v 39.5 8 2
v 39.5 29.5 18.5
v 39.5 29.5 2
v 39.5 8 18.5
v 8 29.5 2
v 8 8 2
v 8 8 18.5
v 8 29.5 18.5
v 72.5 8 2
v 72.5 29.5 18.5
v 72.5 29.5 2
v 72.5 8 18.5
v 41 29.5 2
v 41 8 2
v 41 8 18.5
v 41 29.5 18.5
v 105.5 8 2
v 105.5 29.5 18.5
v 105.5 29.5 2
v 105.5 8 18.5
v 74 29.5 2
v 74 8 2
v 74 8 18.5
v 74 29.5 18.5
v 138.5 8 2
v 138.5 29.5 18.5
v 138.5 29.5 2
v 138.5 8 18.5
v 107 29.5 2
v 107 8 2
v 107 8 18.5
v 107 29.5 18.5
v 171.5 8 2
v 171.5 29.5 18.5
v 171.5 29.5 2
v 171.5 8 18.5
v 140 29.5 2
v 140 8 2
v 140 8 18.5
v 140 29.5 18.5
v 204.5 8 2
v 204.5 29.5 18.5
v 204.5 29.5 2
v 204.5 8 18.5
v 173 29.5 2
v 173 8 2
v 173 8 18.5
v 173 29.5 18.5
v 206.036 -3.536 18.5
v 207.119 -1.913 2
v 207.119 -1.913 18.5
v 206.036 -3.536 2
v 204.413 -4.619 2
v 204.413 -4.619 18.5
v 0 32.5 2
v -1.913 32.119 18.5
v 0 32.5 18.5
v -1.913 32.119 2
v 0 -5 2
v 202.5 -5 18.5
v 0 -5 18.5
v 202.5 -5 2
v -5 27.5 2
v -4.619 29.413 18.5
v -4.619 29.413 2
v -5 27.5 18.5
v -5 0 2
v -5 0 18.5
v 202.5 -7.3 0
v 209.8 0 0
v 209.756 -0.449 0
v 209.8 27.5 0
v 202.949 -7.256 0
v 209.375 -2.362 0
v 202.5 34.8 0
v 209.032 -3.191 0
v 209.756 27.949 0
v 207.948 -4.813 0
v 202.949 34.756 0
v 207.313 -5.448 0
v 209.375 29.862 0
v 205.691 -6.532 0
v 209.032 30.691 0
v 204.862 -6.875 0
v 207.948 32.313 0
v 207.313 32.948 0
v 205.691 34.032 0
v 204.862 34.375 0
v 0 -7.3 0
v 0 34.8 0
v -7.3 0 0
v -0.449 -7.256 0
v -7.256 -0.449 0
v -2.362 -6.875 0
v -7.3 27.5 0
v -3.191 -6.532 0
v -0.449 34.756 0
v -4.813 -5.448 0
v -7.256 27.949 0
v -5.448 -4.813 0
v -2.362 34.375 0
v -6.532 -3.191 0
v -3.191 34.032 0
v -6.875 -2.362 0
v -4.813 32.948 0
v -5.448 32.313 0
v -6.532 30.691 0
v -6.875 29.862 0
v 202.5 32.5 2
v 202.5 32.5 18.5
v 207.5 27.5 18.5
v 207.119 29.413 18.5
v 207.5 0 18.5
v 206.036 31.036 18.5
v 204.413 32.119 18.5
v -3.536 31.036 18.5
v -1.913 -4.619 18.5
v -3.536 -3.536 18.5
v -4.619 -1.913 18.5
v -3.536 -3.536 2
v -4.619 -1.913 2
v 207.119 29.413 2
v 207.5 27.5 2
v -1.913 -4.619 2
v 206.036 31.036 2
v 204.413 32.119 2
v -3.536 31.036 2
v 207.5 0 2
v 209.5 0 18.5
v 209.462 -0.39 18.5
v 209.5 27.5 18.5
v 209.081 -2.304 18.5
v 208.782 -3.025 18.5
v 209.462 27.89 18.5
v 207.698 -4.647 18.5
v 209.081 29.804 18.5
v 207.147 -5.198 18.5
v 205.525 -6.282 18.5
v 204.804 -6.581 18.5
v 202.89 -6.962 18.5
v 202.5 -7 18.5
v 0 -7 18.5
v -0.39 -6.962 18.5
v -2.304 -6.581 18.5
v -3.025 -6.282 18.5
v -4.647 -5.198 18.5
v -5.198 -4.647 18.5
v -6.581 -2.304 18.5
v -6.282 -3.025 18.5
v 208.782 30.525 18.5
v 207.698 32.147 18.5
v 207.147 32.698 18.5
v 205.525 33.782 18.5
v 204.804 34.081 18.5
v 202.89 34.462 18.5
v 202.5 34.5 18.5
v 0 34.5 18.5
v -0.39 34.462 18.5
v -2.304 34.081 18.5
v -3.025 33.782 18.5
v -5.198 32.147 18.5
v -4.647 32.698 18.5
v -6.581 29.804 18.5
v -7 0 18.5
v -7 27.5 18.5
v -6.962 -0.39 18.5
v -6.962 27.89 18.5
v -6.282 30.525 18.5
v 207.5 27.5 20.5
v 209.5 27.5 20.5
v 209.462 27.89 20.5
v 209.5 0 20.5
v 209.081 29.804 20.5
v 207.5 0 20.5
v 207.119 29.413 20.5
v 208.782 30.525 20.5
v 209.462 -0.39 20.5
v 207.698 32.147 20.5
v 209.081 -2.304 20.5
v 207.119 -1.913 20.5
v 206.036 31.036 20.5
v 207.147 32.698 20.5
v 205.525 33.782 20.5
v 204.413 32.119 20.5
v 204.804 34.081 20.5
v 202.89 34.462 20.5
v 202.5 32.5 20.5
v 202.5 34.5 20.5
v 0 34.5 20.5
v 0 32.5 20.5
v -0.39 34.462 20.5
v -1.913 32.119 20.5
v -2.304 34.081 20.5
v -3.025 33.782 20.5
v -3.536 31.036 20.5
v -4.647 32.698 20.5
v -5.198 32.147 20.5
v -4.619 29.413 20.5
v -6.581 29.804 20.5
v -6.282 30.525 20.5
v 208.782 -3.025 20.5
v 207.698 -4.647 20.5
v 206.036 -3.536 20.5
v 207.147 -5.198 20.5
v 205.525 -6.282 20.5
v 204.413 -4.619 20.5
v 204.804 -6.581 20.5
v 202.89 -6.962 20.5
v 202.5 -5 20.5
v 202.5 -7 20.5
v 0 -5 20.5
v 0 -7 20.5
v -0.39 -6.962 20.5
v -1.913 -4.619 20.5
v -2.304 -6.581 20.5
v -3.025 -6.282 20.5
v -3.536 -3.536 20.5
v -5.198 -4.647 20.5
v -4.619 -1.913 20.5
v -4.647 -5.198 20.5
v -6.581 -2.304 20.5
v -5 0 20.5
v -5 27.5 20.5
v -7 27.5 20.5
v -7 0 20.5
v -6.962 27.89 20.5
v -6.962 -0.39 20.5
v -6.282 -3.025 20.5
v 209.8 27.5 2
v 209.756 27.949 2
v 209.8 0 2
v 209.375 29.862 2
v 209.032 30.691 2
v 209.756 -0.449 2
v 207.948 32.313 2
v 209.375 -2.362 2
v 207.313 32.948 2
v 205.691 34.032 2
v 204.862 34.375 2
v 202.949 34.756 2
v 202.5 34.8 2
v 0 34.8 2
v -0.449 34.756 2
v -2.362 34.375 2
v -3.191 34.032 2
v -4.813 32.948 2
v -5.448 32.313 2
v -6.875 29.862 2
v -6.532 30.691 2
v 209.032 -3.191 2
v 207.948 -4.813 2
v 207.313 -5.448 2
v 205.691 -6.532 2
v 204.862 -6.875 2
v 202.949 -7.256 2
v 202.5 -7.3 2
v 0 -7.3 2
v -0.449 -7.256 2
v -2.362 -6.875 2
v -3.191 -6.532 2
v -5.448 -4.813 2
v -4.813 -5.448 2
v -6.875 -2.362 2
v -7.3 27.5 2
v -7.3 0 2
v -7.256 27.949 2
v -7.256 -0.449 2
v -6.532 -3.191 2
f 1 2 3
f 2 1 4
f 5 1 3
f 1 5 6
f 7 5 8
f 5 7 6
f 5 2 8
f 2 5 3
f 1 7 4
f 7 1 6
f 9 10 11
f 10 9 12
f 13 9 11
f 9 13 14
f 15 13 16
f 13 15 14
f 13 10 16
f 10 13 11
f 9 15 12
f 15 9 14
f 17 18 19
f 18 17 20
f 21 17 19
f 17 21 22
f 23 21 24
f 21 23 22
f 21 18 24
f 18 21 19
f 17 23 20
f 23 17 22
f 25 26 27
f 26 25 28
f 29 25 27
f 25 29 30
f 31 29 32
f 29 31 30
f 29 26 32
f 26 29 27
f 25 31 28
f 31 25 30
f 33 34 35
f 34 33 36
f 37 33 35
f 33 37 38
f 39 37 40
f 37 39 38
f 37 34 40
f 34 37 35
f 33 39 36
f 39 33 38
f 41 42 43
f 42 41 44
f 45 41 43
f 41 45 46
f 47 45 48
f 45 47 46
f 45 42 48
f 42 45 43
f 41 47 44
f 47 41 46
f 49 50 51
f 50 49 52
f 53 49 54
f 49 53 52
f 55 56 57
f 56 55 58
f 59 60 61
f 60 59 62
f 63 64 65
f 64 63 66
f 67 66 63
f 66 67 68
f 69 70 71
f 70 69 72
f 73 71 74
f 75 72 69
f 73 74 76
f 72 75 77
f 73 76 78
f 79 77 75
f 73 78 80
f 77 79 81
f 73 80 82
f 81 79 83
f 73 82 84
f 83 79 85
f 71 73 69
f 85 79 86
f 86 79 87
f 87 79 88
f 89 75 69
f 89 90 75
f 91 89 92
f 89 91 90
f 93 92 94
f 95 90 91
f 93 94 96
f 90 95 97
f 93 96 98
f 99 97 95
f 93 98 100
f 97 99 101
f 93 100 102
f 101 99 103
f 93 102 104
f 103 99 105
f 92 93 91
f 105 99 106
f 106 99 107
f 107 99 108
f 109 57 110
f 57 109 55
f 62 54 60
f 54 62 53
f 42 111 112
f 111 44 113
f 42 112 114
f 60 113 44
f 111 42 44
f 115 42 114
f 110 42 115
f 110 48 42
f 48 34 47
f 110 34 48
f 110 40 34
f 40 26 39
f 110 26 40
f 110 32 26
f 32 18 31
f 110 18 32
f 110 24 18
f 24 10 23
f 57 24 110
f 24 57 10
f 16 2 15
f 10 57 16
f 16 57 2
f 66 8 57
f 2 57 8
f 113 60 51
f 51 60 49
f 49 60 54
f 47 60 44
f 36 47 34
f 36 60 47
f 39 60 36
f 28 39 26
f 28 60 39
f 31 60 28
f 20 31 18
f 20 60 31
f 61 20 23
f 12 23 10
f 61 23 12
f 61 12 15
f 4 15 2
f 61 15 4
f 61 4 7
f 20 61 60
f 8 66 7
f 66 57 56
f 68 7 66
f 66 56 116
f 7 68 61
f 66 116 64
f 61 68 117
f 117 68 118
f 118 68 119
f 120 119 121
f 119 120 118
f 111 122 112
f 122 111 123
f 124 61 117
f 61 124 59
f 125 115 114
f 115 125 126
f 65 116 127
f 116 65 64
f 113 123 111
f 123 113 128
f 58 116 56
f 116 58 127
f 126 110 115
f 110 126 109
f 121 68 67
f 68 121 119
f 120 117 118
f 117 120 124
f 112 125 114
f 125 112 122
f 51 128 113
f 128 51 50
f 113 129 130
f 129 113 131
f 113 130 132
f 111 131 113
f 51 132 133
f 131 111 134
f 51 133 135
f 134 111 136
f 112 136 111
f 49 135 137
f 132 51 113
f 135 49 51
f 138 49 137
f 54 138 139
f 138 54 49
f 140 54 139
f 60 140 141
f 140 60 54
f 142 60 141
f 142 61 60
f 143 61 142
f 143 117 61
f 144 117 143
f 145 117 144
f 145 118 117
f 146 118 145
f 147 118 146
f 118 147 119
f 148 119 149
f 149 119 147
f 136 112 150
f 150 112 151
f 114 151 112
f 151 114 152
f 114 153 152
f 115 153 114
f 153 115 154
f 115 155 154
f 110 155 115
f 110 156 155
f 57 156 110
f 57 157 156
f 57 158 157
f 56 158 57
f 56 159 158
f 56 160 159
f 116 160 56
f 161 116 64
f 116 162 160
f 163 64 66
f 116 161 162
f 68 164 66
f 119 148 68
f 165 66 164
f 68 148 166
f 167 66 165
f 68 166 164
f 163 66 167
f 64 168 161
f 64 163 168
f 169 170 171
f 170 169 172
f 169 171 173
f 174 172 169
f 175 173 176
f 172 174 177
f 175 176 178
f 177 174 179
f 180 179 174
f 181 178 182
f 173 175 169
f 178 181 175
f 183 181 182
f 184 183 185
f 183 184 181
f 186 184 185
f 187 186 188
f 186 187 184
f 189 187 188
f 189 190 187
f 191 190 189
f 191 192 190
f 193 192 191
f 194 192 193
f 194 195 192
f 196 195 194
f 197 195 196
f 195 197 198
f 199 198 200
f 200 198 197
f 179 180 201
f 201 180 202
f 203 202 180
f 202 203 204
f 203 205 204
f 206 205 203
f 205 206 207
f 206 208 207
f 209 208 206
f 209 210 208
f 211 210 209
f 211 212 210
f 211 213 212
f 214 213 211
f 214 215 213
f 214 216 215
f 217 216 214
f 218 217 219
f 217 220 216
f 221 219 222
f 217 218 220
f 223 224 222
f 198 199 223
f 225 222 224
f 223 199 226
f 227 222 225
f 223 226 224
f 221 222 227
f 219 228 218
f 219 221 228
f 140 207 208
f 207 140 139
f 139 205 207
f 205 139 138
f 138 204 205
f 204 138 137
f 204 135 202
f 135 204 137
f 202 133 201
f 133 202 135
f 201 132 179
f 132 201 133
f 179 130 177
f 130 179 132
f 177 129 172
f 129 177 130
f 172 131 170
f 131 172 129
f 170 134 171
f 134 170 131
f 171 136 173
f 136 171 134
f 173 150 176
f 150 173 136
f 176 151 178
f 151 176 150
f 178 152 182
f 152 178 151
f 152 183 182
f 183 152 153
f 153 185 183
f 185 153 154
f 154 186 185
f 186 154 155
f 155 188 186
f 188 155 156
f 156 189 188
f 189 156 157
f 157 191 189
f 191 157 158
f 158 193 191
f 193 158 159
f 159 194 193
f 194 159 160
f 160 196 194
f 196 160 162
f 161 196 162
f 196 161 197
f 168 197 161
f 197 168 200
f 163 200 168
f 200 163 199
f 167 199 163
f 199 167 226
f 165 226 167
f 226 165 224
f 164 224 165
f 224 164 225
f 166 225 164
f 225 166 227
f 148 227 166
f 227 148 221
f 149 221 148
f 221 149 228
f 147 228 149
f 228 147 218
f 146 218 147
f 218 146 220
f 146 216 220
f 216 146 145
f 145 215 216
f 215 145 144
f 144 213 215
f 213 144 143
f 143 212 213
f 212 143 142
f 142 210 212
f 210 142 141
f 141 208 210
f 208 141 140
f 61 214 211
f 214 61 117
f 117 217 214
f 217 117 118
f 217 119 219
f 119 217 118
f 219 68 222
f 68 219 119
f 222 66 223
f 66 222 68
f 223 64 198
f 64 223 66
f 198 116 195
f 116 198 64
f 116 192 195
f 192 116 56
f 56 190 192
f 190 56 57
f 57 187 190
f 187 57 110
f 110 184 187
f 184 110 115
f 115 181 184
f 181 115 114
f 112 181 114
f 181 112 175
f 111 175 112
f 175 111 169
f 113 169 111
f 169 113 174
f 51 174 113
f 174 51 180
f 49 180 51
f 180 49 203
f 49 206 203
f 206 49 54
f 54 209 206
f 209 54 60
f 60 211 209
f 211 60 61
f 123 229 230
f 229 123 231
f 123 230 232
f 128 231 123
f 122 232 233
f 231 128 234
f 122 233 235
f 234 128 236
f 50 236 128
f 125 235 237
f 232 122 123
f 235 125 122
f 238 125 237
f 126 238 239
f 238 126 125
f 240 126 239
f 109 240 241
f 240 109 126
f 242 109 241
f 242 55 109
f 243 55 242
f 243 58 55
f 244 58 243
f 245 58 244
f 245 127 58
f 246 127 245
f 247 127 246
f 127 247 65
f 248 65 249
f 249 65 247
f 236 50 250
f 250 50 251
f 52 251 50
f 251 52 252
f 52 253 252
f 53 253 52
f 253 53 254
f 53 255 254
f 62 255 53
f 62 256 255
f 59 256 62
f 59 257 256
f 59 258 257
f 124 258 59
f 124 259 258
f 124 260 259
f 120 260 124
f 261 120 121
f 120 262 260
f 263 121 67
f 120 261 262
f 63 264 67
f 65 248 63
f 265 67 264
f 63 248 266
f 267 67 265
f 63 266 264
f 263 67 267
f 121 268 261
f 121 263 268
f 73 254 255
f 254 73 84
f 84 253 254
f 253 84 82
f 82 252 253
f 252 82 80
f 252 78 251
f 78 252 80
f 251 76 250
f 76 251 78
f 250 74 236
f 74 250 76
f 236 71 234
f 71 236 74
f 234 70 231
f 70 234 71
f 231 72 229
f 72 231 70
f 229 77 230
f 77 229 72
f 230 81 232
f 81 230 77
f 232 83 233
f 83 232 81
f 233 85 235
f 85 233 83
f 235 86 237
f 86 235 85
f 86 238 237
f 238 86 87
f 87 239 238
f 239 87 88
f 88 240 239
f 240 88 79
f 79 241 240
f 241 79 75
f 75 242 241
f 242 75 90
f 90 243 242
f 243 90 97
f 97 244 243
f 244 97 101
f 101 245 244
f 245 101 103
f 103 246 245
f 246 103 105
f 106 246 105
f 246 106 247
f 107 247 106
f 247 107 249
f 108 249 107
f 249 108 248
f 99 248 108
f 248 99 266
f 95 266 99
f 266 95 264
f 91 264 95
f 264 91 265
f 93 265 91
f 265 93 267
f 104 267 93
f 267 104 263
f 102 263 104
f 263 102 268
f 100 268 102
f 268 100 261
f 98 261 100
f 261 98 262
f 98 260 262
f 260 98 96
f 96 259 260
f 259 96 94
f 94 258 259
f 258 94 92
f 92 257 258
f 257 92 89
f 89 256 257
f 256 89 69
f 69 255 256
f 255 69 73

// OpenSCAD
// Generated by SolidPython 1.1.3 on 2026-02-21 18:42:21


union() {
	union() {
		difference() {
			linear_extrude(height = 18.5000000000) {
				offset(r = 5.0000000000) {
					square(size = [202.5000000000, 27.5000000000]);
				}
			}
			union() {
				translate(v = [8.0000000000, 8.0000000000, 2.0000000000]) {
					cube(size = [31.5000000000, 21.5000000000, 16.5100000000]);
				}
				translate(v = [41.0000000000, 8.0000000000, 2.0000000000]) {
					cube(size = [31.5000000000, 21.5000000000, 16.5100000000]);
				}
				translate(v = [74.0000000000, 8.0000000000, 2.0000000000]) {
					cube(size = [31.5000000000, 21.5000000000, 16.5100000000]);
				}
				translate(v = [107.0000000000, 8.0000000000, 2.0000000000]) {
					cube(size = [31.5000000000, 21.5000000000, 16.5100000000]);
				}
				translate(v = [140.0000000000, 8.0000000000, 2.0000000000]) {
					cube(size = [31.5000000000, 21.5000000000, 16.5100000000]);
				}
				translate(v = [173.0000000000, 8.0000000000, 2.0000000000]) {
					cube(size = [31.5000000000, 21.5000000000, 16.5100000000]);
				}
			}
		}
		translate(v = [0, 0, 18.5000000000]) {
			linear_extrude(height = 2.0000000000) {
				difference() {
					offset(r = 2.0000000000) {
						offset(r = 5.0000000000) {
							square(size = [202.5000000000, 27.5000000000]);
						}
					}
					offset(r = 5.0000000000) {
						square(size = [202.5000000000, 27.5000000000]);
					}
				}
			}
		}
	}
	linear_extrude(height = 2.0000000000) {
		difference() {
			offset(r = 2.3000000000) {
				offset(r = 5.0000000000) {
					square(size = [202.5000000000, 27.5000000000]);
				}
			}
			offset(r = 5.0000000000) {
				square(size = [202.5000000000, 27.5000000000]);
			}
		}
	}
}
/***********************************************
*********      SolidPython code:      **********
************************************************
 
"""SolidPython geometry building for storage cases."""

from typing import List, Union

from solid import (
    cube,
    difference,
    linear_extrude,
    offset,
    scad_render_to_file,
    square,
    translate,
    union,
)

from .config import Config
from .layout import GridLayoutResult, MixedLayoutResult, SlotRect


def build_base_tray(
    slots: List[SlotRect],
    total_width: float,
    total_length: float,
    config: Config,
):
    """Build the solid base tray (floor + perimeter walls) with slot cavities subtracted."""
    wall = config.wall_thickness
    base_h = config.base_height
    max_height = max(s.height for s in slots)

    if config.case_size is not None:
        outer_x, outer_y = config.case_size
    outer_z = base_h + max_height
    r = config.corner_radius

    if config.case_size is not None:
        pass  # outer_x, outer_y already set
    else:
        corner_inset = (r + 1.0) if r > 0 else 0
        corner_padding = 2 * corner_inset
        outer_x = total_width + 2 * wall + corner_padding
        outer_y = total_length + 2 * wall + corner_padding

    if r > 0:
        # Round only outer corners in XY plane: 2D offset + linear_extrude
        base_2d = square([outer_x - 2 * r, outer_y - 2 * r])
        rounded_2d = offset(r=r)(base_2d)
        outer_box = linear_extrude(height=outer_z)(rounded_2d)
    else:
        outer_box = cube([outer_x, outer_y, outer_z])

    # Subtract each slot cavity (use uniform depth so all slots are clearly visible)
    # Inset by corner_radius + safety margin so cavities don't cut into rounded corners
    cavity_inset = (r + 1.0) if r > 0 else 0
    cavities = []
    for slot in slots:
        cavity = translate([wall + cavity_inset + slot.x, wall + cavity_inset + slot.y, base_h])(
            cube([slot.width, slot.length, max_height + 0.01])  # +epsilon for clean cut
        )
        cavities.append(cavity)

    if cavities:
        tray = difference()(outer_box, union()(*cavities))
    else:
        tray = outer_box

    if config.stackable:
        lip_width = config.stack_lip_width
        lip_height = config.stack_lip_height
        clearance = config.stack_clearance

        # Top lip: extends OUTWARD from top (bottom of upper case fits over this)
        if r > 0:
            outer_2d = offset(r=r)(square([outer_x - 2 * r, outer_y - 2 * r]))
        else:
            outer_2d = square([outer_x, outer_y])
        # Lip ring: outer = body + 2*lip_width, inner = body
        lip_outer = offset(r=lip_width)(outer_2d)
        lip_ring = difference()(lip_outer, outer_2d)
        lip_3d = translate([0, 0, outer_z])(linear_extrude(height=lip_height)(lip_ring))
        tray = union()(tray, lip_3d)

        # Bottom rim: extends OUTWARD so it fits over the lip of case below
        # Rim is a ring: outer = body + 2*lip_width + 2*clearance, inner = body
        rim_outer = offset(r=lip_width + clearance)(outer_2d)
        rim_ring = difference()(rim_outer, outer_2d)
        rim_3d = linear_extrude(height=lip_height)(rim_ring)
        tray = union()(tray, rim_3d)

    return tray


def assemble_case(
    layout_result: Union[GridLayoutResult, MixedLayoutResult],
    config: Config,
):
    """Assemble the complete case: base tray with slot cavities (dividers are implicit)."""
    slots = layout_result.slots
    total_width = layout_result.total_width
    total_length = layout_result.total_length

    case = build_base_tray(slots, total_width, total_length, config)
    return case


def render_to_file(assembly, filepath: str) -> None:
    """Render the assembly to an OpenSCAD .scad file."""
    scad_render_to_file(assembly, filepath)
 
 
************************************************/
